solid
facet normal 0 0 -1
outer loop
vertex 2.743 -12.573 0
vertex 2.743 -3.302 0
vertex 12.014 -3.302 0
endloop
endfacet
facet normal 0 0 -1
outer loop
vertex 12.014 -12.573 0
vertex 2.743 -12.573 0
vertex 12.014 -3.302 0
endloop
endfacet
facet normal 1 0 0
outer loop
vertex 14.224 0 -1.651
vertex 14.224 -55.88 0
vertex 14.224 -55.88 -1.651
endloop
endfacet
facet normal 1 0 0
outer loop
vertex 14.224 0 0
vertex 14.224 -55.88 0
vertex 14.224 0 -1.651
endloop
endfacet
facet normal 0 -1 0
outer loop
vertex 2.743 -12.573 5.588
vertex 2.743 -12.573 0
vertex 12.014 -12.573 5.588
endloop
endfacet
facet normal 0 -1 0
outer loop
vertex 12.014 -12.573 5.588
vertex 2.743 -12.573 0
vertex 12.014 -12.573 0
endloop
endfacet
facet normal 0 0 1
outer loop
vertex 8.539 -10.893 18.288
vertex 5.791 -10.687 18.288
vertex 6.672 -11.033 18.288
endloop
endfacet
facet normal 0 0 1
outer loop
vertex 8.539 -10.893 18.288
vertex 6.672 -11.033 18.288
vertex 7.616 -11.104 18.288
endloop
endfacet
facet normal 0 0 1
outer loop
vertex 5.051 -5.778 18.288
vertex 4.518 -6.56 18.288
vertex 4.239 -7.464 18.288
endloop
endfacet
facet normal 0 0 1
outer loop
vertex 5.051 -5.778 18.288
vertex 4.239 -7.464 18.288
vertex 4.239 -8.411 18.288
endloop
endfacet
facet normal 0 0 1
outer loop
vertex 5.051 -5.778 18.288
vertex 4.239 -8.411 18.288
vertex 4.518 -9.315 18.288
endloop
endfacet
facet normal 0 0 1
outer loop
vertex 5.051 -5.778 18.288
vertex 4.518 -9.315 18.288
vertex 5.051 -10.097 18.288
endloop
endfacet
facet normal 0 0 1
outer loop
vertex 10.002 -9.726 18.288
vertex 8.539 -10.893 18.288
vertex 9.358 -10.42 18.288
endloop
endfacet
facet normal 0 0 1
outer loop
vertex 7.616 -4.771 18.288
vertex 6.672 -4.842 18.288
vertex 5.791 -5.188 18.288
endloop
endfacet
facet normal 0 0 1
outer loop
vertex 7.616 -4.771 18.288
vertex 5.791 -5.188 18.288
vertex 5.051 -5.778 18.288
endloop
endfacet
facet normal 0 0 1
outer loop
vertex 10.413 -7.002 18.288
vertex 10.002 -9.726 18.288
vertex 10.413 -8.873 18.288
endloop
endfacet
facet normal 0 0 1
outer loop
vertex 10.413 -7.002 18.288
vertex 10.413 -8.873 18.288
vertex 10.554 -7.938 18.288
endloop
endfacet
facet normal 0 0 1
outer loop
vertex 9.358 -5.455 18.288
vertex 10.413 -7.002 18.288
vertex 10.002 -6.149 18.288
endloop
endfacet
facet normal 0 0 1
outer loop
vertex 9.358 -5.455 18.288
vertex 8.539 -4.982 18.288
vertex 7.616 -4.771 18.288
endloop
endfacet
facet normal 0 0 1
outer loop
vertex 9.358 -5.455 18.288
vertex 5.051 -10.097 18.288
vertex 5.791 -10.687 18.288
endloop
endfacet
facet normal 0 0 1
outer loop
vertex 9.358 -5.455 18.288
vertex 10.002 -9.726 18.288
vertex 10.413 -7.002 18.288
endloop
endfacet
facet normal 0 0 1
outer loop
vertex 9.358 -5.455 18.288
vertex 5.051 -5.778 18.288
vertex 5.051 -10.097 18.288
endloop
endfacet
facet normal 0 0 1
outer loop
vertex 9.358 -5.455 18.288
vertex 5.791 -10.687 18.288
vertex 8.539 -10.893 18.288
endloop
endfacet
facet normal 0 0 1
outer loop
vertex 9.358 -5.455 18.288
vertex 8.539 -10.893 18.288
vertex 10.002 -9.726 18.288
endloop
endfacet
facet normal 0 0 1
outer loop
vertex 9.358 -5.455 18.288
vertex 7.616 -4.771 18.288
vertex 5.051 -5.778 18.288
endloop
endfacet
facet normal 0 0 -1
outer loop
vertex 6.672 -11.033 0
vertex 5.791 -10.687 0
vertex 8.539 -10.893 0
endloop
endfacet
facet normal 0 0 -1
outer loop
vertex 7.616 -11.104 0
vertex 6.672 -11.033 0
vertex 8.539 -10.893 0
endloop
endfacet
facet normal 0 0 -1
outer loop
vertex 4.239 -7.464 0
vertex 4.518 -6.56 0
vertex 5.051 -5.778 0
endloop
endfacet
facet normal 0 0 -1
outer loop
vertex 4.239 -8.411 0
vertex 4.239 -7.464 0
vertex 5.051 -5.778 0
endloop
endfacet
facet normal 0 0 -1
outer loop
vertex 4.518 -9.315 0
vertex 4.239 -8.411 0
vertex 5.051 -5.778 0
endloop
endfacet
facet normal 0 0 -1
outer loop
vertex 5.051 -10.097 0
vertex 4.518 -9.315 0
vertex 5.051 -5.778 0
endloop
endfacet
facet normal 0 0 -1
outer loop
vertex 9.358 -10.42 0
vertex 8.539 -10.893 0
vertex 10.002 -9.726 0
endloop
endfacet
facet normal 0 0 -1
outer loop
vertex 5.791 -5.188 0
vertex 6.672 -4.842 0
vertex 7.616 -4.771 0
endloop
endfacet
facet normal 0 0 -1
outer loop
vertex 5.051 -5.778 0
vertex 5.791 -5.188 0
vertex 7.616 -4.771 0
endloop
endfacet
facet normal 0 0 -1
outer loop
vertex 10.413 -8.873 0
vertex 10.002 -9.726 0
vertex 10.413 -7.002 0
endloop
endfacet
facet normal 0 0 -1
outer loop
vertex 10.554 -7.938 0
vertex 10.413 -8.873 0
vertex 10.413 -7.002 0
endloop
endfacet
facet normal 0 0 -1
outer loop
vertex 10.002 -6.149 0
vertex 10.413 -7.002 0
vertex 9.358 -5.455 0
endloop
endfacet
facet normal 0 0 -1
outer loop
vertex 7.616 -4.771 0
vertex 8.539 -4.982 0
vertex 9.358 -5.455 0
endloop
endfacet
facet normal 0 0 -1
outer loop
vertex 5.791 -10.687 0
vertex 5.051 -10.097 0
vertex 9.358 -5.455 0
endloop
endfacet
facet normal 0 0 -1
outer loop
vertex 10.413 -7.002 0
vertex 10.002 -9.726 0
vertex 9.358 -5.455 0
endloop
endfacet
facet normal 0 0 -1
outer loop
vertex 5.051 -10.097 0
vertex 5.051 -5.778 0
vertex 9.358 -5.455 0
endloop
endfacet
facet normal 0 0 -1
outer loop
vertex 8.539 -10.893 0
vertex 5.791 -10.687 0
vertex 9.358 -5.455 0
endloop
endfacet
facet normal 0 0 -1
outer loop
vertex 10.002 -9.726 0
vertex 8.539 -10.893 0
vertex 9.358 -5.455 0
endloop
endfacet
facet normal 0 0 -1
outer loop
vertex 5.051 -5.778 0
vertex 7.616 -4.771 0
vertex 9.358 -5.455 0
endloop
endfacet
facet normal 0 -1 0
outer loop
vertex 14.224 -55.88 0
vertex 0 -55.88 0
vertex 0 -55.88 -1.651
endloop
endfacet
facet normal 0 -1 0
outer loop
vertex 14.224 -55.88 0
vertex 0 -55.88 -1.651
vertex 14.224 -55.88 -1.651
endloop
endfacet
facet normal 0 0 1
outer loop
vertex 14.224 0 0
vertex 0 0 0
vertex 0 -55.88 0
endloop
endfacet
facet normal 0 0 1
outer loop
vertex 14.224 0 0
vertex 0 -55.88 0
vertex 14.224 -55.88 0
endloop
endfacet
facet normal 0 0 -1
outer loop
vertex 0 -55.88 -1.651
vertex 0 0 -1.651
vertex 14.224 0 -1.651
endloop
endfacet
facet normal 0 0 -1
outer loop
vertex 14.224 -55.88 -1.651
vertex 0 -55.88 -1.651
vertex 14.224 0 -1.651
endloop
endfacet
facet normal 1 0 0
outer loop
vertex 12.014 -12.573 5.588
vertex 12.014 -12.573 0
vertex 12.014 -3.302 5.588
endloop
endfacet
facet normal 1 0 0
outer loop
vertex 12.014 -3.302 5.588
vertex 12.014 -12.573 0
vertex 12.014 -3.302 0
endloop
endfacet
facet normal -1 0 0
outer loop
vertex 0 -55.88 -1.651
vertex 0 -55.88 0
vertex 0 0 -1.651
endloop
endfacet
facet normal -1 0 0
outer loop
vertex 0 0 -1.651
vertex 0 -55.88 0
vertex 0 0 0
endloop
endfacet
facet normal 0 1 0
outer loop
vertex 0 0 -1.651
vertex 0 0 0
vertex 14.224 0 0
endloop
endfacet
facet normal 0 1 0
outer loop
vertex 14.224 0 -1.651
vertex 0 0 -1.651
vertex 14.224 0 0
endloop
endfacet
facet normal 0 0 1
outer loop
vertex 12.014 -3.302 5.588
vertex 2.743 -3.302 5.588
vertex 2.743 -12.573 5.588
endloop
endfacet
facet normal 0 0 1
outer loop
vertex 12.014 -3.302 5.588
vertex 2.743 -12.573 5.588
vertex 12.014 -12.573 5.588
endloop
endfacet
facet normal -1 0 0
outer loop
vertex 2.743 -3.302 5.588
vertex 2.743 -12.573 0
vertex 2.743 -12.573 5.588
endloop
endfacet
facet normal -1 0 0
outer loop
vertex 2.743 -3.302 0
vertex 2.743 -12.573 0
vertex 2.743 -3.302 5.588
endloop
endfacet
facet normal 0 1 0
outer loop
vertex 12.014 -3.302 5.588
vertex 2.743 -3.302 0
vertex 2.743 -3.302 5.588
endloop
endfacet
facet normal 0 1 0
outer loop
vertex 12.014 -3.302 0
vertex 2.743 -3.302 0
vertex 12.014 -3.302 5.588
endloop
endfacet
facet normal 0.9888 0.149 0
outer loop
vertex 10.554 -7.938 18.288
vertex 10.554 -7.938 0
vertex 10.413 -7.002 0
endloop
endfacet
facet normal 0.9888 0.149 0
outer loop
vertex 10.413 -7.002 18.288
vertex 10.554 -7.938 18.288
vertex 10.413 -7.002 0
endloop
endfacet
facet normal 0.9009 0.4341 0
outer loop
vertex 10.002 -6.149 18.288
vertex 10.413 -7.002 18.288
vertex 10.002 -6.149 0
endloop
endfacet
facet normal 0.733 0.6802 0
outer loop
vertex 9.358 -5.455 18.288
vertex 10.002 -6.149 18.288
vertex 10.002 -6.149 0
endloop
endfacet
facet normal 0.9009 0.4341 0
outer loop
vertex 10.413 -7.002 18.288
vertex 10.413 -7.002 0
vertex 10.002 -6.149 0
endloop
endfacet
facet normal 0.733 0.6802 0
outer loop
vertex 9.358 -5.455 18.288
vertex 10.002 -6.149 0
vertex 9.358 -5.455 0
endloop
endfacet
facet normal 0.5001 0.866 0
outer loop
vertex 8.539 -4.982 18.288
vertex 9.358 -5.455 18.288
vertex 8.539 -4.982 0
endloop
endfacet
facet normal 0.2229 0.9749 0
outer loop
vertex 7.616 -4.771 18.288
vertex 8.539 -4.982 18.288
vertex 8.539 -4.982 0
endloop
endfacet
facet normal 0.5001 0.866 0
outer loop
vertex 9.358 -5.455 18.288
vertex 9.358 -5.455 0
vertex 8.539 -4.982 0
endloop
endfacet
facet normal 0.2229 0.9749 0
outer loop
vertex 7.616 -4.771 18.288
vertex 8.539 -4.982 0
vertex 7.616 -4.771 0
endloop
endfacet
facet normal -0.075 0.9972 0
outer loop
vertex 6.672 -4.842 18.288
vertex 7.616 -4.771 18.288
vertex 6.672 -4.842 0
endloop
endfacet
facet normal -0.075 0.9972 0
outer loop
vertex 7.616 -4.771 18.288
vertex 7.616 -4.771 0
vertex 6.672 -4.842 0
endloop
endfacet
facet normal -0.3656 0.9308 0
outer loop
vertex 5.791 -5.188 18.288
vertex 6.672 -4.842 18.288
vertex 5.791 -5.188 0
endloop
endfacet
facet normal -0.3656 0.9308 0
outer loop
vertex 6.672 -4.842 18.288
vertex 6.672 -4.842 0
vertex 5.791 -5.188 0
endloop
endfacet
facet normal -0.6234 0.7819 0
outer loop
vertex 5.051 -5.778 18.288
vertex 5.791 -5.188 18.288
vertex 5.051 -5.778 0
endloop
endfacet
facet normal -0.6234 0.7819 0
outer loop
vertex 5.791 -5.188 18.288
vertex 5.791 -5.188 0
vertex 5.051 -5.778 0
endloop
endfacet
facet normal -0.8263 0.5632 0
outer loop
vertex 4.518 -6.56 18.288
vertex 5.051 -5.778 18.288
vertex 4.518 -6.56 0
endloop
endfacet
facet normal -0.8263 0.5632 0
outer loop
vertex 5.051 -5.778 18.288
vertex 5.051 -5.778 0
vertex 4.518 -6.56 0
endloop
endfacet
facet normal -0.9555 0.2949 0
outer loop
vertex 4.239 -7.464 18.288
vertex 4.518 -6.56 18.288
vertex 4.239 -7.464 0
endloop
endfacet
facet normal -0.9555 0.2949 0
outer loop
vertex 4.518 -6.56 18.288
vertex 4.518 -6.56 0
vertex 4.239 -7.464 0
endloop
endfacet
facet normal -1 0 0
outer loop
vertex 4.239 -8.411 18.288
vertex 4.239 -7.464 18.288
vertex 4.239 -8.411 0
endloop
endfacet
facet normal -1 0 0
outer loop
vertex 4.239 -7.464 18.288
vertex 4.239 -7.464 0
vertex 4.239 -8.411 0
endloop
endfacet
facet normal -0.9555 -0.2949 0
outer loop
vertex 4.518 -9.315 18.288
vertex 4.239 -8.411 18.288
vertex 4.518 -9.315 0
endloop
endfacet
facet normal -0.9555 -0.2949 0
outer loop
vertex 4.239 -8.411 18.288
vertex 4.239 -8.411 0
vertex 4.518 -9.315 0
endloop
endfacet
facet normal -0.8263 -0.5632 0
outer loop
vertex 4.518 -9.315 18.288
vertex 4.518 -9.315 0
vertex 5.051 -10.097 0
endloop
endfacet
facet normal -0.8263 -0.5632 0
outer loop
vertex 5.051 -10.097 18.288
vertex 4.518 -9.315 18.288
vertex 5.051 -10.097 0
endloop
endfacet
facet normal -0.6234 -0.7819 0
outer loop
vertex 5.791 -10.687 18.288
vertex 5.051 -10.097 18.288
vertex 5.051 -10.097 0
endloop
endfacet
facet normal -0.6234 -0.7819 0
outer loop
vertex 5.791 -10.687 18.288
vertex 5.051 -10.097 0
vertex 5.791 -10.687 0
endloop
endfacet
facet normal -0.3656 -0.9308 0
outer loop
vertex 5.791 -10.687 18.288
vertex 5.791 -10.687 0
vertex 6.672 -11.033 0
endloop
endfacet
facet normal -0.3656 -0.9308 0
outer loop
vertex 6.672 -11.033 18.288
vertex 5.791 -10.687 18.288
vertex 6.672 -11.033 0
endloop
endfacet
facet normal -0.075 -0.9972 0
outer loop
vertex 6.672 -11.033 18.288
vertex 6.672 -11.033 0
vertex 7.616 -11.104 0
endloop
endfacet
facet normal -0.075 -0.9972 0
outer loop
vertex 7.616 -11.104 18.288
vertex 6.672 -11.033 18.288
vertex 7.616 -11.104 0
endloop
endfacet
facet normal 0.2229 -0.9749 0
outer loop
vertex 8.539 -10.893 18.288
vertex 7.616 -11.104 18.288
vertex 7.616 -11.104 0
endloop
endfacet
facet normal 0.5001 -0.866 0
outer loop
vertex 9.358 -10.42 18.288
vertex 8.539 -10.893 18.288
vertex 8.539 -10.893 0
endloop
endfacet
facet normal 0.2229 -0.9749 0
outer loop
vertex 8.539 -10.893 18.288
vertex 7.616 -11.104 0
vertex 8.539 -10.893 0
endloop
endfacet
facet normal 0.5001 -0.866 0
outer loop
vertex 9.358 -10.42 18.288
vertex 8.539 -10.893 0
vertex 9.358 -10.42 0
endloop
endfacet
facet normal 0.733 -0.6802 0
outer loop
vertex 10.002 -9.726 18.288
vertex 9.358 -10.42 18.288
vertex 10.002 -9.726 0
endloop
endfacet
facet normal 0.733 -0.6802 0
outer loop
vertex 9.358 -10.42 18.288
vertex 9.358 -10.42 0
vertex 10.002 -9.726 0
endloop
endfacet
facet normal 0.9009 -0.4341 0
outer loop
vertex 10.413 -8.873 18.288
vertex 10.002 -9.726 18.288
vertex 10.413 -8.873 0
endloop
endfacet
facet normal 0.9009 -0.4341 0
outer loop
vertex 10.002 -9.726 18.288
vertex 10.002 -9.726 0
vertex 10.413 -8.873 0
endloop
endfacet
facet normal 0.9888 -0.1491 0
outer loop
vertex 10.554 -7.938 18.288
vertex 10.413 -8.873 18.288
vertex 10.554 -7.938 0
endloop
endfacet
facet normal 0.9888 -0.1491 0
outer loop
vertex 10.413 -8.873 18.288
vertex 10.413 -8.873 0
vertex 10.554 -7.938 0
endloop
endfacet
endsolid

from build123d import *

# Parameters (mm, degrees)
F0_W     = 14.224
F0_H     = 55.88
F0_W_2   = 9.271
F0_H_2   = 9.271
F0_R     = 3.175
F1_DEPTH = 1.651
F2_DEPTH = 5.588
F3_DEPTH = 18.288


with BuildPart() as f1:
    # F0 (on Top) → F1 (new body)
    with BuildSketch(Plane.XY):
        with Locations((7.112, -27.94)):
            Rectangle(F0_W, F0_H)
        with Locations((7.3787, -7.9375)):
            Rectangle(F0_W_2, F0_H_2, mode=Mode.SUBTRACT)
        with Locations((7.3787, -7.9375)):
            Rectangle(F0_W_2, F0_H_2)
        with Locations((7.3787, -7.9375)):
            Circle(F0_R, mode=Mode.SUBTRACT)
        with Locations((7.3787, -7.9375)):
            Circle(F0_R)
    extrude(amount=-F1_DEPTH)


with BuildPart() as f2:
    # F0 (on Top) → F2 (new body)
    with BuildSketch(Plane.XY):
        with Locations((7.3787, -7.9375)):
            Rectangle(F0_W_2, F0_H_2)
        with Locations((7.3787, -7.9375)):
            Circle(F0_R, mode=Mode.SUBTRACT)
        with Locations((7.3787, -7.9375)):
            Circle(F0_R)
    extrude(amount=F2_DEPTH)


with BuildPart() as f3:
    # F0 (on Top) → F3 (new body)
    with BuildSketch(Plane.XY):
        with Locations((7.3787, -7.9375)):
            Circle(F0_R)
    extrude(amount=F3_DEPTH)


solid = Compound([f1.part, f2.part, f3.part])
